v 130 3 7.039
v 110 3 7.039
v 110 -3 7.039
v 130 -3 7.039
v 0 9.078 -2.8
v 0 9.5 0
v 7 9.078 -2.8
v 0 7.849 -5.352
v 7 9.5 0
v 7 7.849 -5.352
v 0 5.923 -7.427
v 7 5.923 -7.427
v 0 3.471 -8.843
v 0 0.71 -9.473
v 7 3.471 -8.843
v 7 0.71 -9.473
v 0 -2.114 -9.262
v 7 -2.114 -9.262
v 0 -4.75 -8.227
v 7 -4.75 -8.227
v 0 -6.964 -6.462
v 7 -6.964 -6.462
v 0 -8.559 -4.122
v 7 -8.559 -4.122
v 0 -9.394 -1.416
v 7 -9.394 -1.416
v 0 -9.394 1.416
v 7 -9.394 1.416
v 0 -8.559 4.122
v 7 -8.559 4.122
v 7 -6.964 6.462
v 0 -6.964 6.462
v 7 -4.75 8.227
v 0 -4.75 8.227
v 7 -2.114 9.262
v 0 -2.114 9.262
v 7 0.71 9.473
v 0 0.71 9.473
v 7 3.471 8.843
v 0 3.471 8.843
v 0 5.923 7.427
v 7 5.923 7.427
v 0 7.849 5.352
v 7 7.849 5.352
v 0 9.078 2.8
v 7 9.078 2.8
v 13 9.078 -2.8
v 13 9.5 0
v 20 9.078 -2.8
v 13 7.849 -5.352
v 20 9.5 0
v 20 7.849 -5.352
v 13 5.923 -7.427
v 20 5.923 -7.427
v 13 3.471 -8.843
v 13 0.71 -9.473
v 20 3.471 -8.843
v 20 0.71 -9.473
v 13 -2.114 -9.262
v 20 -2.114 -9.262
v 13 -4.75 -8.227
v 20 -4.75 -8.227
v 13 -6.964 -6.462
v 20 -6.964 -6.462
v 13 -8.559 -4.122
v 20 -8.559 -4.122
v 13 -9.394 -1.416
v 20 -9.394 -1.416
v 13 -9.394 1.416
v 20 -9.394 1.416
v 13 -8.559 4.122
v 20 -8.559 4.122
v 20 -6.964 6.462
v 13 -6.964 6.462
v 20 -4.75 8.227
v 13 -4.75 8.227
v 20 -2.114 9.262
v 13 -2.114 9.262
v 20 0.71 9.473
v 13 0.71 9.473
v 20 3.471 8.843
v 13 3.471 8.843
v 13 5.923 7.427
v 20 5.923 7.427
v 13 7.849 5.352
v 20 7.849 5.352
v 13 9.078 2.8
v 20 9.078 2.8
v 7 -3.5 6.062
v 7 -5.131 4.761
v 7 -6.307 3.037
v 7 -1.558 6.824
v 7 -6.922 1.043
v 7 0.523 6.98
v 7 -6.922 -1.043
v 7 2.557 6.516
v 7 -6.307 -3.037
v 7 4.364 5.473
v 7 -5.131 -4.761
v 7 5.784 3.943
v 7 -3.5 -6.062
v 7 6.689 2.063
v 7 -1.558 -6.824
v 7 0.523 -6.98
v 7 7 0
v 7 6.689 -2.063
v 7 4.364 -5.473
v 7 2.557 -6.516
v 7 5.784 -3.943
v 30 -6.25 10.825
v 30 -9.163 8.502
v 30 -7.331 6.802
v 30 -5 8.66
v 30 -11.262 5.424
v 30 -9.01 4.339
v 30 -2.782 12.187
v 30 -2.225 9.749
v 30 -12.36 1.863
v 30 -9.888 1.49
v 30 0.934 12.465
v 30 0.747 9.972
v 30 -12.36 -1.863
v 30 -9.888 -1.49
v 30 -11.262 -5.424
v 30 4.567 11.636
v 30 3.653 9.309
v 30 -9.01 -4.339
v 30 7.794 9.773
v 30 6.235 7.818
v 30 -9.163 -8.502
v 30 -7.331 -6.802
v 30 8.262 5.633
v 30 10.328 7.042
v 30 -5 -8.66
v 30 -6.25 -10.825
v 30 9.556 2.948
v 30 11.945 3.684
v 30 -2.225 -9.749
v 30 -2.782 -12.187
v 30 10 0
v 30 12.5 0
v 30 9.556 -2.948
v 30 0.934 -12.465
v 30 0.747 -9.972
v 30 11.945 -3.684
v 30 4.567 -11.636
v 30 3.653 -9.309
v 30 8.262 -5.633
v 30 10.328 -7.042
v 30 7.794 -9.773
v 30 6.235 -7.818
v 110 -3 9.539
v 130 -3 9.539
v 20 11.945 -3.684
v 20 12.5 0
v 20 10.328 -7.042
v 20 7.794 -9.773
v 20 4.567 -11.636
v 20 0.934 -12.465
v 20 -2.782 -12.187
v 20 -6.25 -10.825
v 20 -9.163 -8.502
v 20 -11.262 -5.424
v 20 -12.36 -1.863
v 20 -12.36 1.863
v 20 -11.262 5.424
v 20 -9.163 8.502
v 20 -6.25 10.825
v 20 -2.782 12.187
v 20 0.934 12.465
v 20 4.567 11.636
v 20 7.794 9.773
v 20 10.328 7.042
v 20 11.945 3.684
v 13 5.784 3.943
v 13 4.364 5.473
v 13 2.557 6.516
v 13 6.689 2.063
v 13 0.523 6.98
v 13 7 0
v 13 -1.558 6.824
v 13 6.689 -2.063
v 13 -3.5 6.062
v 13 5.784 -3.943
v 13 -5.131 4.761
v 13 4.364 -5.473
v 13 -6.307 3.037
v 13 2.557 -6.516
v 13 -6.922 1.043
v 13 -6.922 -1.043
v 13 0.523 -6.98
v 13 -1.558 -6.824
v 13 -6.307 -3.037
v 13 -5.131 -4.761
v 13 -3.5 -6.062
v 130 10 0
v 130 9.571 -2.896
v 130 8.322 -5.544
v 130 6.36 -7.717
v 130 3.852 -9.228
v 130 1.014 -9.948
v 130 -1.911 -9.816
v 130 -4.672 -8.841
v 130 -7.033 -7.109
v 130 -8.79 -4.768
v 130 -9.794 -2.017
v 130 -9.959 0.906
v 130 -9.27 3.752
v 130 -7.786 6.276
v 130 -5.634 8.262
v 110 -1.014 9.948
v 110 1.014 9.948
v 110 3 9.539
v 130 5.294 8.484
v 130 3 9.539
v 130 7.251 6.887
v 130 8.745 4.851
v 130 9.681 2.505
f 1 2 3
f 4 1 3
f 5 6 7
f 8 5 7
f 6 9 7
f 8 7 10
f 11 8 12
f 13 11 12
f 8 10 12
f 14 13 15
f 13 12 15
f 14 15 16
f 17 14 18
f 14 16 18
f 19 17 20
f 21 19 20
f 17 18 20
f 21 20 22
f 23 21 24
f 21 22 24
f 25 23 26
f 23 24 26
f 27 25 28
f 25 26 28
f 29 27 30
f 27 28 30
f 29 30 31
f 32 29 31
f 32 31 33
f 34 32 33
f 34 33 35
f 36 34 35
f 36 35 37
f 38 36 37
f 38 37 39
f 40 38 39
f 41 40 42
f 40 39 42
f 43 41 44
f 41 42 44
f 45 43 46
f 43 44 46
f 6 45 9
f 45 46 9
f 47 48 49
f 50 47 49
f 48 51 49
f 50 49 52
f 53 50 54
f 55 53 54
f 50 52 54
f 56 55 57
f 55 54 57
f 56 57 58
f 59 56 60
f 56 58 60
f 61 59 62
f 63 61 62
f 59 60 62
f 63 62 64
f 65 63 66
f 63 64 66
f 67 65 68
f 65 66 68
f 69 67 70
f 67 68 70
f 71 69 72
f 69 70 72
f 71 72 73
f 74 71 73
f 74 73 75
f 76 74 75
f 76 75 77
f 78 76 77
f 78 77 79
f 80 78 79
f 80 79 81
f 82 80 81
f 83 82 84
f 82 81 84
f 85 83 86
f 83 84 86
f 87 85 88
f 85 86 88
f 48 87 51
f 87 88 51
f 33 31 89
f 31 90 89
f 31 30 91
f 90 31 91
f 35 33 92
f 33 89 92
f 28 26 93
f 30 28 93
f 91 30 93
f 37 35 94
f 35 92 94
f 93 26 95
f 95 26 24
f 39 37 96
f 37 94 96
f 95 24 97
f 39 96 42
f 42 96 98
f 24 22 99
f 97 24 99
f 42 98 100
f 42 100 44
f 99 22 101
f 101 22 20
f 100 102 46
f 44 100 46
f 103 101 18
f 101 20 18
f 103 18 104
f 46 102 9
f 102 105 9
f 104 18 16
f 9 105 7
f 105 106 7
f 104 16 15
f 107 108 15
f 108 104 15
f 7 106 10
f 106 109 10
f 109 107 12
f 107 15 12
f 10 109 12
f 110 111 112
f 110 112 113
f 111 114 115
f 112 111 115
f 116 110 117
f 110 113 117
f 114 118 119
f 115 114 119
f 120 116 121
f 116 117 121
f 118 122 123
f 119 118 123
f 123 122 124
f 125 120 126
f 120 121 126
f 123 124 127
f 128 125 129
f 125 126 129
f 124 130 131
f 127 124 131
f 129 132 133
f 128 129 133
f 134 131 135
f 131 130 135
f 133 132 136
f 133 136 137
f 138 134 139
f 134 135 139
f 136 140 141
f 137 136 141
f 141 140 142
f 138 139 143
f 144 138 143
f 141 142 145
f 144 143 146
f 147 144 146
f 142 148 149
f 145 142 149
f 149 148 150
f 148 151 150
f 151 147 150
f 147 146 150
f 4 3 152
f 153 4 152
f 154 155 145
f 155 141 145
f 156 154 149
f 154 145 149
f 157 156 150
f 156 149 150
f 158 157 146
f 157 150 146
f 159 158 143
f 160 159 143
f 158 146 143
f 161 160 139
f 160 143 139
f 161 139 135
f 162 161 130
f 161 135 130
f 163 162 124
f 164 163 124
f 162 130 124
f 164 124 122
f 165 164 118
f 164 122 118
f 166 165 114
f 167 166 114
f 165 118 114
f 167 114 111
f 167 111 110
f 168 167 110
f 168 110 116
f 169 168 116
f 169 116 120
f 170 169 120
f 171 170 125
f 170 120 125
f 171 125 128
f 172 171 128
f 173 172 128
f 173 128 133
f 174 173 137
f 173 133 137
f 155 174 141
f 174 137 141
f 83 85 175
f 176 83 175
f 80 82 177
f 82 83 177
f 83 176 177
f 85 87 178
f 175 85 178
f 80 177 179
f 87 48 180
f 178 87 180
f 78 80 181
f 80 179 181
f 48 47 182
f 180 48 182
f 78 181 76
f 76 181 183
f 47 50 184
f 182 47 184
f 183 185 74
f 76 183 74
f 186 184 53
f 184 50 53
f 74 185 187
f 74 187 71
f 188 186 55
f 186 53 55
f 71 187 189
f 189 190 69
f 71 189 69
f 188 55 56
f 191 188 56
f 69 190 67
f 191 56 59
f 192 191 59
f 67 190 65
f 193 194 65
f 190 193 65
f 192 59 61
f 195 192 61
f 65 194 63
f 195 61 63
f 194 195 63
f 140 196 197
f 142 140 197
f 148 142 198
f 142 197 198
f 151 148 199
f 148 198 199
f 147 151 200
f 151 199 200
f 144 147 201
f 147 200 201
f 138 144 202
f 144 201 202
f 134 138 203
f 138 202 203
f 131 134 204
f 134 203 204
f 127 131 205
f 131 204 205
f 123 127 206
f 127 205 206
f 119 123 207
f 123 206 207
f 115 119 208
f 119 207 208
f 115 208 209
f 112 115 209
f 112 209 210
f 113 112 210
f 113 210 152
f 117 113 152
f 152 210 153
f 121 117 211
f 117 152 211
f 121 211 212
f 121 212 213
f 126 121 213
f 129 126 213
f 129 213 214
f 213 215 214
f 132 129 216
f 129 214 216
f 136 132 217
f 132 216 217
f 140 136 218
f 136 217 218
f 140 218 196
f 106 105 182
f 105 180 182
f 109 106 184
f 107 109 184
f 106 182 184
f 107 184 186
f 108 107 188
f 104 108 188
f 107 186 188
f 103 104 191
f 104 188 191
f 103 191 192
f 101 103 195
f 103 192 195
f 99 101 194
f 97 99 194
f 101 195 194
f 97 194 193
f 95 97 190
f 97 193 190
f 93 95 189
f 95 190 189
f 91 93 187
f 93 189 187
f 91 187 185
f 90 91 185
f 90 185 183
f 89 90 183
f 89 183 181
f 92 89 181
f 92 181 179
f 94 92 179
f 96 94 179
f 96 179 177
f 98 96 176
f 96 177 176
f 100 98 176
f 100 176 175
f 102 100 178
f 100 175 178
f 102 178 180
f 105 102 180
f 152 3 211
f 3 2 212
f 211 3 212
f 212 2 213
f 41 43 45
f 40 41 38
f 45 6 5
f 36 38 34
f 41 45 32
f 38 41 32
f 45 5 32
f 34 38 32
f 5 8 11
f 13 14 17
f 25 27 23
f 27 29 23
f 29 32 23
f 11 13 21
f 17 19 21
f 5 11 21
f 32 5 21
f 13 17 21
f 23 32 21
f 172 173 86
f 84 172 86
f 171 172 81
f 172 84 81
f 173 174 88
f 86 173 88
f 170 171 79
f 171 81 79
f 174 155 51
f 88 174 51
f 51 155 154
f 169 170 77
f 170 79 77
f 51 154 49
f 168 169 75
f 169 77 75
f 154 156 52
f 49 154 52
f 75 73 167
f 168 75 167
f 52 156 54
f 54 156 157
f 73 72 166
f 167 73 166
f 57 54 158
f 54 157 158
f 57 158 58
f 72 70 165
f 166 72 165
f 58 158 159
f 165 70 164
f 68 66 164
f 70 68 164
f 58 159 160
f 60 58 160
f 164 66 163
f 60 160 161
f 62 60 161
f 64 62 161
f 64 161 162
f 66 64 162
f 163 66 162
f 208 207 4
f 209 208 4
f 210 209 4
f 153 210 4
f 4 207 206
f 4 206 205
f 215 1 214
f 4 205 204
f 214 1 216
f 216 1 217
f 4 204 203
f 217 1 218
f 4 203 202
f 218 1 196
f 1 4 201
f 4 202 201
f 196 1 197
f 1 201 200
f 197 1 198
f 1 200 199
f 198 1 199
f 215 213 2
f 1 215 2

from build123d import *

# Parameters (mm, degrees)
CUT_EXTRUDE1_DEPTH = 20


with BuildPart() as part:
    # Sketch1 → Revolve1 (revolve)
    with BuildSketch(Plane.XY):
        Polygon((0, 0), (0, 9.5), (7, 9.5), (7, 7), (13, 7), (13, 9.5), (20, 9.5), (20, 12.5), (30, 12.5), (30, 10), (130, 10), (130, 0), align=None)
    revolve(axis=Axis((130, 0, 0), (-1, 0, 0)))

    # Sketch2 → Cut-Extrude1 (cut)
    with BuildSketch(Plane(origin=(130, 0, 0), x_dir=(0, 0, -1), z_dir=(1, 0, 0))):
        with BuildLine():
            Line((-9.539392014, 3), (-7.039392014, 3))
            Line((-7.039392014, 3), (-7.039392014, -3))
            Line((-7.039392014, -3), (-9.539392014, -3))
            ThreePointArc((-9.539392014, -3), (-10, 0), (-9.539392014, 3))
        make_face()
    extrude(amount=-CUT_EXTRUDE1_DEPTH, mode=Mode.SUBTRACT)


solid = part.part
